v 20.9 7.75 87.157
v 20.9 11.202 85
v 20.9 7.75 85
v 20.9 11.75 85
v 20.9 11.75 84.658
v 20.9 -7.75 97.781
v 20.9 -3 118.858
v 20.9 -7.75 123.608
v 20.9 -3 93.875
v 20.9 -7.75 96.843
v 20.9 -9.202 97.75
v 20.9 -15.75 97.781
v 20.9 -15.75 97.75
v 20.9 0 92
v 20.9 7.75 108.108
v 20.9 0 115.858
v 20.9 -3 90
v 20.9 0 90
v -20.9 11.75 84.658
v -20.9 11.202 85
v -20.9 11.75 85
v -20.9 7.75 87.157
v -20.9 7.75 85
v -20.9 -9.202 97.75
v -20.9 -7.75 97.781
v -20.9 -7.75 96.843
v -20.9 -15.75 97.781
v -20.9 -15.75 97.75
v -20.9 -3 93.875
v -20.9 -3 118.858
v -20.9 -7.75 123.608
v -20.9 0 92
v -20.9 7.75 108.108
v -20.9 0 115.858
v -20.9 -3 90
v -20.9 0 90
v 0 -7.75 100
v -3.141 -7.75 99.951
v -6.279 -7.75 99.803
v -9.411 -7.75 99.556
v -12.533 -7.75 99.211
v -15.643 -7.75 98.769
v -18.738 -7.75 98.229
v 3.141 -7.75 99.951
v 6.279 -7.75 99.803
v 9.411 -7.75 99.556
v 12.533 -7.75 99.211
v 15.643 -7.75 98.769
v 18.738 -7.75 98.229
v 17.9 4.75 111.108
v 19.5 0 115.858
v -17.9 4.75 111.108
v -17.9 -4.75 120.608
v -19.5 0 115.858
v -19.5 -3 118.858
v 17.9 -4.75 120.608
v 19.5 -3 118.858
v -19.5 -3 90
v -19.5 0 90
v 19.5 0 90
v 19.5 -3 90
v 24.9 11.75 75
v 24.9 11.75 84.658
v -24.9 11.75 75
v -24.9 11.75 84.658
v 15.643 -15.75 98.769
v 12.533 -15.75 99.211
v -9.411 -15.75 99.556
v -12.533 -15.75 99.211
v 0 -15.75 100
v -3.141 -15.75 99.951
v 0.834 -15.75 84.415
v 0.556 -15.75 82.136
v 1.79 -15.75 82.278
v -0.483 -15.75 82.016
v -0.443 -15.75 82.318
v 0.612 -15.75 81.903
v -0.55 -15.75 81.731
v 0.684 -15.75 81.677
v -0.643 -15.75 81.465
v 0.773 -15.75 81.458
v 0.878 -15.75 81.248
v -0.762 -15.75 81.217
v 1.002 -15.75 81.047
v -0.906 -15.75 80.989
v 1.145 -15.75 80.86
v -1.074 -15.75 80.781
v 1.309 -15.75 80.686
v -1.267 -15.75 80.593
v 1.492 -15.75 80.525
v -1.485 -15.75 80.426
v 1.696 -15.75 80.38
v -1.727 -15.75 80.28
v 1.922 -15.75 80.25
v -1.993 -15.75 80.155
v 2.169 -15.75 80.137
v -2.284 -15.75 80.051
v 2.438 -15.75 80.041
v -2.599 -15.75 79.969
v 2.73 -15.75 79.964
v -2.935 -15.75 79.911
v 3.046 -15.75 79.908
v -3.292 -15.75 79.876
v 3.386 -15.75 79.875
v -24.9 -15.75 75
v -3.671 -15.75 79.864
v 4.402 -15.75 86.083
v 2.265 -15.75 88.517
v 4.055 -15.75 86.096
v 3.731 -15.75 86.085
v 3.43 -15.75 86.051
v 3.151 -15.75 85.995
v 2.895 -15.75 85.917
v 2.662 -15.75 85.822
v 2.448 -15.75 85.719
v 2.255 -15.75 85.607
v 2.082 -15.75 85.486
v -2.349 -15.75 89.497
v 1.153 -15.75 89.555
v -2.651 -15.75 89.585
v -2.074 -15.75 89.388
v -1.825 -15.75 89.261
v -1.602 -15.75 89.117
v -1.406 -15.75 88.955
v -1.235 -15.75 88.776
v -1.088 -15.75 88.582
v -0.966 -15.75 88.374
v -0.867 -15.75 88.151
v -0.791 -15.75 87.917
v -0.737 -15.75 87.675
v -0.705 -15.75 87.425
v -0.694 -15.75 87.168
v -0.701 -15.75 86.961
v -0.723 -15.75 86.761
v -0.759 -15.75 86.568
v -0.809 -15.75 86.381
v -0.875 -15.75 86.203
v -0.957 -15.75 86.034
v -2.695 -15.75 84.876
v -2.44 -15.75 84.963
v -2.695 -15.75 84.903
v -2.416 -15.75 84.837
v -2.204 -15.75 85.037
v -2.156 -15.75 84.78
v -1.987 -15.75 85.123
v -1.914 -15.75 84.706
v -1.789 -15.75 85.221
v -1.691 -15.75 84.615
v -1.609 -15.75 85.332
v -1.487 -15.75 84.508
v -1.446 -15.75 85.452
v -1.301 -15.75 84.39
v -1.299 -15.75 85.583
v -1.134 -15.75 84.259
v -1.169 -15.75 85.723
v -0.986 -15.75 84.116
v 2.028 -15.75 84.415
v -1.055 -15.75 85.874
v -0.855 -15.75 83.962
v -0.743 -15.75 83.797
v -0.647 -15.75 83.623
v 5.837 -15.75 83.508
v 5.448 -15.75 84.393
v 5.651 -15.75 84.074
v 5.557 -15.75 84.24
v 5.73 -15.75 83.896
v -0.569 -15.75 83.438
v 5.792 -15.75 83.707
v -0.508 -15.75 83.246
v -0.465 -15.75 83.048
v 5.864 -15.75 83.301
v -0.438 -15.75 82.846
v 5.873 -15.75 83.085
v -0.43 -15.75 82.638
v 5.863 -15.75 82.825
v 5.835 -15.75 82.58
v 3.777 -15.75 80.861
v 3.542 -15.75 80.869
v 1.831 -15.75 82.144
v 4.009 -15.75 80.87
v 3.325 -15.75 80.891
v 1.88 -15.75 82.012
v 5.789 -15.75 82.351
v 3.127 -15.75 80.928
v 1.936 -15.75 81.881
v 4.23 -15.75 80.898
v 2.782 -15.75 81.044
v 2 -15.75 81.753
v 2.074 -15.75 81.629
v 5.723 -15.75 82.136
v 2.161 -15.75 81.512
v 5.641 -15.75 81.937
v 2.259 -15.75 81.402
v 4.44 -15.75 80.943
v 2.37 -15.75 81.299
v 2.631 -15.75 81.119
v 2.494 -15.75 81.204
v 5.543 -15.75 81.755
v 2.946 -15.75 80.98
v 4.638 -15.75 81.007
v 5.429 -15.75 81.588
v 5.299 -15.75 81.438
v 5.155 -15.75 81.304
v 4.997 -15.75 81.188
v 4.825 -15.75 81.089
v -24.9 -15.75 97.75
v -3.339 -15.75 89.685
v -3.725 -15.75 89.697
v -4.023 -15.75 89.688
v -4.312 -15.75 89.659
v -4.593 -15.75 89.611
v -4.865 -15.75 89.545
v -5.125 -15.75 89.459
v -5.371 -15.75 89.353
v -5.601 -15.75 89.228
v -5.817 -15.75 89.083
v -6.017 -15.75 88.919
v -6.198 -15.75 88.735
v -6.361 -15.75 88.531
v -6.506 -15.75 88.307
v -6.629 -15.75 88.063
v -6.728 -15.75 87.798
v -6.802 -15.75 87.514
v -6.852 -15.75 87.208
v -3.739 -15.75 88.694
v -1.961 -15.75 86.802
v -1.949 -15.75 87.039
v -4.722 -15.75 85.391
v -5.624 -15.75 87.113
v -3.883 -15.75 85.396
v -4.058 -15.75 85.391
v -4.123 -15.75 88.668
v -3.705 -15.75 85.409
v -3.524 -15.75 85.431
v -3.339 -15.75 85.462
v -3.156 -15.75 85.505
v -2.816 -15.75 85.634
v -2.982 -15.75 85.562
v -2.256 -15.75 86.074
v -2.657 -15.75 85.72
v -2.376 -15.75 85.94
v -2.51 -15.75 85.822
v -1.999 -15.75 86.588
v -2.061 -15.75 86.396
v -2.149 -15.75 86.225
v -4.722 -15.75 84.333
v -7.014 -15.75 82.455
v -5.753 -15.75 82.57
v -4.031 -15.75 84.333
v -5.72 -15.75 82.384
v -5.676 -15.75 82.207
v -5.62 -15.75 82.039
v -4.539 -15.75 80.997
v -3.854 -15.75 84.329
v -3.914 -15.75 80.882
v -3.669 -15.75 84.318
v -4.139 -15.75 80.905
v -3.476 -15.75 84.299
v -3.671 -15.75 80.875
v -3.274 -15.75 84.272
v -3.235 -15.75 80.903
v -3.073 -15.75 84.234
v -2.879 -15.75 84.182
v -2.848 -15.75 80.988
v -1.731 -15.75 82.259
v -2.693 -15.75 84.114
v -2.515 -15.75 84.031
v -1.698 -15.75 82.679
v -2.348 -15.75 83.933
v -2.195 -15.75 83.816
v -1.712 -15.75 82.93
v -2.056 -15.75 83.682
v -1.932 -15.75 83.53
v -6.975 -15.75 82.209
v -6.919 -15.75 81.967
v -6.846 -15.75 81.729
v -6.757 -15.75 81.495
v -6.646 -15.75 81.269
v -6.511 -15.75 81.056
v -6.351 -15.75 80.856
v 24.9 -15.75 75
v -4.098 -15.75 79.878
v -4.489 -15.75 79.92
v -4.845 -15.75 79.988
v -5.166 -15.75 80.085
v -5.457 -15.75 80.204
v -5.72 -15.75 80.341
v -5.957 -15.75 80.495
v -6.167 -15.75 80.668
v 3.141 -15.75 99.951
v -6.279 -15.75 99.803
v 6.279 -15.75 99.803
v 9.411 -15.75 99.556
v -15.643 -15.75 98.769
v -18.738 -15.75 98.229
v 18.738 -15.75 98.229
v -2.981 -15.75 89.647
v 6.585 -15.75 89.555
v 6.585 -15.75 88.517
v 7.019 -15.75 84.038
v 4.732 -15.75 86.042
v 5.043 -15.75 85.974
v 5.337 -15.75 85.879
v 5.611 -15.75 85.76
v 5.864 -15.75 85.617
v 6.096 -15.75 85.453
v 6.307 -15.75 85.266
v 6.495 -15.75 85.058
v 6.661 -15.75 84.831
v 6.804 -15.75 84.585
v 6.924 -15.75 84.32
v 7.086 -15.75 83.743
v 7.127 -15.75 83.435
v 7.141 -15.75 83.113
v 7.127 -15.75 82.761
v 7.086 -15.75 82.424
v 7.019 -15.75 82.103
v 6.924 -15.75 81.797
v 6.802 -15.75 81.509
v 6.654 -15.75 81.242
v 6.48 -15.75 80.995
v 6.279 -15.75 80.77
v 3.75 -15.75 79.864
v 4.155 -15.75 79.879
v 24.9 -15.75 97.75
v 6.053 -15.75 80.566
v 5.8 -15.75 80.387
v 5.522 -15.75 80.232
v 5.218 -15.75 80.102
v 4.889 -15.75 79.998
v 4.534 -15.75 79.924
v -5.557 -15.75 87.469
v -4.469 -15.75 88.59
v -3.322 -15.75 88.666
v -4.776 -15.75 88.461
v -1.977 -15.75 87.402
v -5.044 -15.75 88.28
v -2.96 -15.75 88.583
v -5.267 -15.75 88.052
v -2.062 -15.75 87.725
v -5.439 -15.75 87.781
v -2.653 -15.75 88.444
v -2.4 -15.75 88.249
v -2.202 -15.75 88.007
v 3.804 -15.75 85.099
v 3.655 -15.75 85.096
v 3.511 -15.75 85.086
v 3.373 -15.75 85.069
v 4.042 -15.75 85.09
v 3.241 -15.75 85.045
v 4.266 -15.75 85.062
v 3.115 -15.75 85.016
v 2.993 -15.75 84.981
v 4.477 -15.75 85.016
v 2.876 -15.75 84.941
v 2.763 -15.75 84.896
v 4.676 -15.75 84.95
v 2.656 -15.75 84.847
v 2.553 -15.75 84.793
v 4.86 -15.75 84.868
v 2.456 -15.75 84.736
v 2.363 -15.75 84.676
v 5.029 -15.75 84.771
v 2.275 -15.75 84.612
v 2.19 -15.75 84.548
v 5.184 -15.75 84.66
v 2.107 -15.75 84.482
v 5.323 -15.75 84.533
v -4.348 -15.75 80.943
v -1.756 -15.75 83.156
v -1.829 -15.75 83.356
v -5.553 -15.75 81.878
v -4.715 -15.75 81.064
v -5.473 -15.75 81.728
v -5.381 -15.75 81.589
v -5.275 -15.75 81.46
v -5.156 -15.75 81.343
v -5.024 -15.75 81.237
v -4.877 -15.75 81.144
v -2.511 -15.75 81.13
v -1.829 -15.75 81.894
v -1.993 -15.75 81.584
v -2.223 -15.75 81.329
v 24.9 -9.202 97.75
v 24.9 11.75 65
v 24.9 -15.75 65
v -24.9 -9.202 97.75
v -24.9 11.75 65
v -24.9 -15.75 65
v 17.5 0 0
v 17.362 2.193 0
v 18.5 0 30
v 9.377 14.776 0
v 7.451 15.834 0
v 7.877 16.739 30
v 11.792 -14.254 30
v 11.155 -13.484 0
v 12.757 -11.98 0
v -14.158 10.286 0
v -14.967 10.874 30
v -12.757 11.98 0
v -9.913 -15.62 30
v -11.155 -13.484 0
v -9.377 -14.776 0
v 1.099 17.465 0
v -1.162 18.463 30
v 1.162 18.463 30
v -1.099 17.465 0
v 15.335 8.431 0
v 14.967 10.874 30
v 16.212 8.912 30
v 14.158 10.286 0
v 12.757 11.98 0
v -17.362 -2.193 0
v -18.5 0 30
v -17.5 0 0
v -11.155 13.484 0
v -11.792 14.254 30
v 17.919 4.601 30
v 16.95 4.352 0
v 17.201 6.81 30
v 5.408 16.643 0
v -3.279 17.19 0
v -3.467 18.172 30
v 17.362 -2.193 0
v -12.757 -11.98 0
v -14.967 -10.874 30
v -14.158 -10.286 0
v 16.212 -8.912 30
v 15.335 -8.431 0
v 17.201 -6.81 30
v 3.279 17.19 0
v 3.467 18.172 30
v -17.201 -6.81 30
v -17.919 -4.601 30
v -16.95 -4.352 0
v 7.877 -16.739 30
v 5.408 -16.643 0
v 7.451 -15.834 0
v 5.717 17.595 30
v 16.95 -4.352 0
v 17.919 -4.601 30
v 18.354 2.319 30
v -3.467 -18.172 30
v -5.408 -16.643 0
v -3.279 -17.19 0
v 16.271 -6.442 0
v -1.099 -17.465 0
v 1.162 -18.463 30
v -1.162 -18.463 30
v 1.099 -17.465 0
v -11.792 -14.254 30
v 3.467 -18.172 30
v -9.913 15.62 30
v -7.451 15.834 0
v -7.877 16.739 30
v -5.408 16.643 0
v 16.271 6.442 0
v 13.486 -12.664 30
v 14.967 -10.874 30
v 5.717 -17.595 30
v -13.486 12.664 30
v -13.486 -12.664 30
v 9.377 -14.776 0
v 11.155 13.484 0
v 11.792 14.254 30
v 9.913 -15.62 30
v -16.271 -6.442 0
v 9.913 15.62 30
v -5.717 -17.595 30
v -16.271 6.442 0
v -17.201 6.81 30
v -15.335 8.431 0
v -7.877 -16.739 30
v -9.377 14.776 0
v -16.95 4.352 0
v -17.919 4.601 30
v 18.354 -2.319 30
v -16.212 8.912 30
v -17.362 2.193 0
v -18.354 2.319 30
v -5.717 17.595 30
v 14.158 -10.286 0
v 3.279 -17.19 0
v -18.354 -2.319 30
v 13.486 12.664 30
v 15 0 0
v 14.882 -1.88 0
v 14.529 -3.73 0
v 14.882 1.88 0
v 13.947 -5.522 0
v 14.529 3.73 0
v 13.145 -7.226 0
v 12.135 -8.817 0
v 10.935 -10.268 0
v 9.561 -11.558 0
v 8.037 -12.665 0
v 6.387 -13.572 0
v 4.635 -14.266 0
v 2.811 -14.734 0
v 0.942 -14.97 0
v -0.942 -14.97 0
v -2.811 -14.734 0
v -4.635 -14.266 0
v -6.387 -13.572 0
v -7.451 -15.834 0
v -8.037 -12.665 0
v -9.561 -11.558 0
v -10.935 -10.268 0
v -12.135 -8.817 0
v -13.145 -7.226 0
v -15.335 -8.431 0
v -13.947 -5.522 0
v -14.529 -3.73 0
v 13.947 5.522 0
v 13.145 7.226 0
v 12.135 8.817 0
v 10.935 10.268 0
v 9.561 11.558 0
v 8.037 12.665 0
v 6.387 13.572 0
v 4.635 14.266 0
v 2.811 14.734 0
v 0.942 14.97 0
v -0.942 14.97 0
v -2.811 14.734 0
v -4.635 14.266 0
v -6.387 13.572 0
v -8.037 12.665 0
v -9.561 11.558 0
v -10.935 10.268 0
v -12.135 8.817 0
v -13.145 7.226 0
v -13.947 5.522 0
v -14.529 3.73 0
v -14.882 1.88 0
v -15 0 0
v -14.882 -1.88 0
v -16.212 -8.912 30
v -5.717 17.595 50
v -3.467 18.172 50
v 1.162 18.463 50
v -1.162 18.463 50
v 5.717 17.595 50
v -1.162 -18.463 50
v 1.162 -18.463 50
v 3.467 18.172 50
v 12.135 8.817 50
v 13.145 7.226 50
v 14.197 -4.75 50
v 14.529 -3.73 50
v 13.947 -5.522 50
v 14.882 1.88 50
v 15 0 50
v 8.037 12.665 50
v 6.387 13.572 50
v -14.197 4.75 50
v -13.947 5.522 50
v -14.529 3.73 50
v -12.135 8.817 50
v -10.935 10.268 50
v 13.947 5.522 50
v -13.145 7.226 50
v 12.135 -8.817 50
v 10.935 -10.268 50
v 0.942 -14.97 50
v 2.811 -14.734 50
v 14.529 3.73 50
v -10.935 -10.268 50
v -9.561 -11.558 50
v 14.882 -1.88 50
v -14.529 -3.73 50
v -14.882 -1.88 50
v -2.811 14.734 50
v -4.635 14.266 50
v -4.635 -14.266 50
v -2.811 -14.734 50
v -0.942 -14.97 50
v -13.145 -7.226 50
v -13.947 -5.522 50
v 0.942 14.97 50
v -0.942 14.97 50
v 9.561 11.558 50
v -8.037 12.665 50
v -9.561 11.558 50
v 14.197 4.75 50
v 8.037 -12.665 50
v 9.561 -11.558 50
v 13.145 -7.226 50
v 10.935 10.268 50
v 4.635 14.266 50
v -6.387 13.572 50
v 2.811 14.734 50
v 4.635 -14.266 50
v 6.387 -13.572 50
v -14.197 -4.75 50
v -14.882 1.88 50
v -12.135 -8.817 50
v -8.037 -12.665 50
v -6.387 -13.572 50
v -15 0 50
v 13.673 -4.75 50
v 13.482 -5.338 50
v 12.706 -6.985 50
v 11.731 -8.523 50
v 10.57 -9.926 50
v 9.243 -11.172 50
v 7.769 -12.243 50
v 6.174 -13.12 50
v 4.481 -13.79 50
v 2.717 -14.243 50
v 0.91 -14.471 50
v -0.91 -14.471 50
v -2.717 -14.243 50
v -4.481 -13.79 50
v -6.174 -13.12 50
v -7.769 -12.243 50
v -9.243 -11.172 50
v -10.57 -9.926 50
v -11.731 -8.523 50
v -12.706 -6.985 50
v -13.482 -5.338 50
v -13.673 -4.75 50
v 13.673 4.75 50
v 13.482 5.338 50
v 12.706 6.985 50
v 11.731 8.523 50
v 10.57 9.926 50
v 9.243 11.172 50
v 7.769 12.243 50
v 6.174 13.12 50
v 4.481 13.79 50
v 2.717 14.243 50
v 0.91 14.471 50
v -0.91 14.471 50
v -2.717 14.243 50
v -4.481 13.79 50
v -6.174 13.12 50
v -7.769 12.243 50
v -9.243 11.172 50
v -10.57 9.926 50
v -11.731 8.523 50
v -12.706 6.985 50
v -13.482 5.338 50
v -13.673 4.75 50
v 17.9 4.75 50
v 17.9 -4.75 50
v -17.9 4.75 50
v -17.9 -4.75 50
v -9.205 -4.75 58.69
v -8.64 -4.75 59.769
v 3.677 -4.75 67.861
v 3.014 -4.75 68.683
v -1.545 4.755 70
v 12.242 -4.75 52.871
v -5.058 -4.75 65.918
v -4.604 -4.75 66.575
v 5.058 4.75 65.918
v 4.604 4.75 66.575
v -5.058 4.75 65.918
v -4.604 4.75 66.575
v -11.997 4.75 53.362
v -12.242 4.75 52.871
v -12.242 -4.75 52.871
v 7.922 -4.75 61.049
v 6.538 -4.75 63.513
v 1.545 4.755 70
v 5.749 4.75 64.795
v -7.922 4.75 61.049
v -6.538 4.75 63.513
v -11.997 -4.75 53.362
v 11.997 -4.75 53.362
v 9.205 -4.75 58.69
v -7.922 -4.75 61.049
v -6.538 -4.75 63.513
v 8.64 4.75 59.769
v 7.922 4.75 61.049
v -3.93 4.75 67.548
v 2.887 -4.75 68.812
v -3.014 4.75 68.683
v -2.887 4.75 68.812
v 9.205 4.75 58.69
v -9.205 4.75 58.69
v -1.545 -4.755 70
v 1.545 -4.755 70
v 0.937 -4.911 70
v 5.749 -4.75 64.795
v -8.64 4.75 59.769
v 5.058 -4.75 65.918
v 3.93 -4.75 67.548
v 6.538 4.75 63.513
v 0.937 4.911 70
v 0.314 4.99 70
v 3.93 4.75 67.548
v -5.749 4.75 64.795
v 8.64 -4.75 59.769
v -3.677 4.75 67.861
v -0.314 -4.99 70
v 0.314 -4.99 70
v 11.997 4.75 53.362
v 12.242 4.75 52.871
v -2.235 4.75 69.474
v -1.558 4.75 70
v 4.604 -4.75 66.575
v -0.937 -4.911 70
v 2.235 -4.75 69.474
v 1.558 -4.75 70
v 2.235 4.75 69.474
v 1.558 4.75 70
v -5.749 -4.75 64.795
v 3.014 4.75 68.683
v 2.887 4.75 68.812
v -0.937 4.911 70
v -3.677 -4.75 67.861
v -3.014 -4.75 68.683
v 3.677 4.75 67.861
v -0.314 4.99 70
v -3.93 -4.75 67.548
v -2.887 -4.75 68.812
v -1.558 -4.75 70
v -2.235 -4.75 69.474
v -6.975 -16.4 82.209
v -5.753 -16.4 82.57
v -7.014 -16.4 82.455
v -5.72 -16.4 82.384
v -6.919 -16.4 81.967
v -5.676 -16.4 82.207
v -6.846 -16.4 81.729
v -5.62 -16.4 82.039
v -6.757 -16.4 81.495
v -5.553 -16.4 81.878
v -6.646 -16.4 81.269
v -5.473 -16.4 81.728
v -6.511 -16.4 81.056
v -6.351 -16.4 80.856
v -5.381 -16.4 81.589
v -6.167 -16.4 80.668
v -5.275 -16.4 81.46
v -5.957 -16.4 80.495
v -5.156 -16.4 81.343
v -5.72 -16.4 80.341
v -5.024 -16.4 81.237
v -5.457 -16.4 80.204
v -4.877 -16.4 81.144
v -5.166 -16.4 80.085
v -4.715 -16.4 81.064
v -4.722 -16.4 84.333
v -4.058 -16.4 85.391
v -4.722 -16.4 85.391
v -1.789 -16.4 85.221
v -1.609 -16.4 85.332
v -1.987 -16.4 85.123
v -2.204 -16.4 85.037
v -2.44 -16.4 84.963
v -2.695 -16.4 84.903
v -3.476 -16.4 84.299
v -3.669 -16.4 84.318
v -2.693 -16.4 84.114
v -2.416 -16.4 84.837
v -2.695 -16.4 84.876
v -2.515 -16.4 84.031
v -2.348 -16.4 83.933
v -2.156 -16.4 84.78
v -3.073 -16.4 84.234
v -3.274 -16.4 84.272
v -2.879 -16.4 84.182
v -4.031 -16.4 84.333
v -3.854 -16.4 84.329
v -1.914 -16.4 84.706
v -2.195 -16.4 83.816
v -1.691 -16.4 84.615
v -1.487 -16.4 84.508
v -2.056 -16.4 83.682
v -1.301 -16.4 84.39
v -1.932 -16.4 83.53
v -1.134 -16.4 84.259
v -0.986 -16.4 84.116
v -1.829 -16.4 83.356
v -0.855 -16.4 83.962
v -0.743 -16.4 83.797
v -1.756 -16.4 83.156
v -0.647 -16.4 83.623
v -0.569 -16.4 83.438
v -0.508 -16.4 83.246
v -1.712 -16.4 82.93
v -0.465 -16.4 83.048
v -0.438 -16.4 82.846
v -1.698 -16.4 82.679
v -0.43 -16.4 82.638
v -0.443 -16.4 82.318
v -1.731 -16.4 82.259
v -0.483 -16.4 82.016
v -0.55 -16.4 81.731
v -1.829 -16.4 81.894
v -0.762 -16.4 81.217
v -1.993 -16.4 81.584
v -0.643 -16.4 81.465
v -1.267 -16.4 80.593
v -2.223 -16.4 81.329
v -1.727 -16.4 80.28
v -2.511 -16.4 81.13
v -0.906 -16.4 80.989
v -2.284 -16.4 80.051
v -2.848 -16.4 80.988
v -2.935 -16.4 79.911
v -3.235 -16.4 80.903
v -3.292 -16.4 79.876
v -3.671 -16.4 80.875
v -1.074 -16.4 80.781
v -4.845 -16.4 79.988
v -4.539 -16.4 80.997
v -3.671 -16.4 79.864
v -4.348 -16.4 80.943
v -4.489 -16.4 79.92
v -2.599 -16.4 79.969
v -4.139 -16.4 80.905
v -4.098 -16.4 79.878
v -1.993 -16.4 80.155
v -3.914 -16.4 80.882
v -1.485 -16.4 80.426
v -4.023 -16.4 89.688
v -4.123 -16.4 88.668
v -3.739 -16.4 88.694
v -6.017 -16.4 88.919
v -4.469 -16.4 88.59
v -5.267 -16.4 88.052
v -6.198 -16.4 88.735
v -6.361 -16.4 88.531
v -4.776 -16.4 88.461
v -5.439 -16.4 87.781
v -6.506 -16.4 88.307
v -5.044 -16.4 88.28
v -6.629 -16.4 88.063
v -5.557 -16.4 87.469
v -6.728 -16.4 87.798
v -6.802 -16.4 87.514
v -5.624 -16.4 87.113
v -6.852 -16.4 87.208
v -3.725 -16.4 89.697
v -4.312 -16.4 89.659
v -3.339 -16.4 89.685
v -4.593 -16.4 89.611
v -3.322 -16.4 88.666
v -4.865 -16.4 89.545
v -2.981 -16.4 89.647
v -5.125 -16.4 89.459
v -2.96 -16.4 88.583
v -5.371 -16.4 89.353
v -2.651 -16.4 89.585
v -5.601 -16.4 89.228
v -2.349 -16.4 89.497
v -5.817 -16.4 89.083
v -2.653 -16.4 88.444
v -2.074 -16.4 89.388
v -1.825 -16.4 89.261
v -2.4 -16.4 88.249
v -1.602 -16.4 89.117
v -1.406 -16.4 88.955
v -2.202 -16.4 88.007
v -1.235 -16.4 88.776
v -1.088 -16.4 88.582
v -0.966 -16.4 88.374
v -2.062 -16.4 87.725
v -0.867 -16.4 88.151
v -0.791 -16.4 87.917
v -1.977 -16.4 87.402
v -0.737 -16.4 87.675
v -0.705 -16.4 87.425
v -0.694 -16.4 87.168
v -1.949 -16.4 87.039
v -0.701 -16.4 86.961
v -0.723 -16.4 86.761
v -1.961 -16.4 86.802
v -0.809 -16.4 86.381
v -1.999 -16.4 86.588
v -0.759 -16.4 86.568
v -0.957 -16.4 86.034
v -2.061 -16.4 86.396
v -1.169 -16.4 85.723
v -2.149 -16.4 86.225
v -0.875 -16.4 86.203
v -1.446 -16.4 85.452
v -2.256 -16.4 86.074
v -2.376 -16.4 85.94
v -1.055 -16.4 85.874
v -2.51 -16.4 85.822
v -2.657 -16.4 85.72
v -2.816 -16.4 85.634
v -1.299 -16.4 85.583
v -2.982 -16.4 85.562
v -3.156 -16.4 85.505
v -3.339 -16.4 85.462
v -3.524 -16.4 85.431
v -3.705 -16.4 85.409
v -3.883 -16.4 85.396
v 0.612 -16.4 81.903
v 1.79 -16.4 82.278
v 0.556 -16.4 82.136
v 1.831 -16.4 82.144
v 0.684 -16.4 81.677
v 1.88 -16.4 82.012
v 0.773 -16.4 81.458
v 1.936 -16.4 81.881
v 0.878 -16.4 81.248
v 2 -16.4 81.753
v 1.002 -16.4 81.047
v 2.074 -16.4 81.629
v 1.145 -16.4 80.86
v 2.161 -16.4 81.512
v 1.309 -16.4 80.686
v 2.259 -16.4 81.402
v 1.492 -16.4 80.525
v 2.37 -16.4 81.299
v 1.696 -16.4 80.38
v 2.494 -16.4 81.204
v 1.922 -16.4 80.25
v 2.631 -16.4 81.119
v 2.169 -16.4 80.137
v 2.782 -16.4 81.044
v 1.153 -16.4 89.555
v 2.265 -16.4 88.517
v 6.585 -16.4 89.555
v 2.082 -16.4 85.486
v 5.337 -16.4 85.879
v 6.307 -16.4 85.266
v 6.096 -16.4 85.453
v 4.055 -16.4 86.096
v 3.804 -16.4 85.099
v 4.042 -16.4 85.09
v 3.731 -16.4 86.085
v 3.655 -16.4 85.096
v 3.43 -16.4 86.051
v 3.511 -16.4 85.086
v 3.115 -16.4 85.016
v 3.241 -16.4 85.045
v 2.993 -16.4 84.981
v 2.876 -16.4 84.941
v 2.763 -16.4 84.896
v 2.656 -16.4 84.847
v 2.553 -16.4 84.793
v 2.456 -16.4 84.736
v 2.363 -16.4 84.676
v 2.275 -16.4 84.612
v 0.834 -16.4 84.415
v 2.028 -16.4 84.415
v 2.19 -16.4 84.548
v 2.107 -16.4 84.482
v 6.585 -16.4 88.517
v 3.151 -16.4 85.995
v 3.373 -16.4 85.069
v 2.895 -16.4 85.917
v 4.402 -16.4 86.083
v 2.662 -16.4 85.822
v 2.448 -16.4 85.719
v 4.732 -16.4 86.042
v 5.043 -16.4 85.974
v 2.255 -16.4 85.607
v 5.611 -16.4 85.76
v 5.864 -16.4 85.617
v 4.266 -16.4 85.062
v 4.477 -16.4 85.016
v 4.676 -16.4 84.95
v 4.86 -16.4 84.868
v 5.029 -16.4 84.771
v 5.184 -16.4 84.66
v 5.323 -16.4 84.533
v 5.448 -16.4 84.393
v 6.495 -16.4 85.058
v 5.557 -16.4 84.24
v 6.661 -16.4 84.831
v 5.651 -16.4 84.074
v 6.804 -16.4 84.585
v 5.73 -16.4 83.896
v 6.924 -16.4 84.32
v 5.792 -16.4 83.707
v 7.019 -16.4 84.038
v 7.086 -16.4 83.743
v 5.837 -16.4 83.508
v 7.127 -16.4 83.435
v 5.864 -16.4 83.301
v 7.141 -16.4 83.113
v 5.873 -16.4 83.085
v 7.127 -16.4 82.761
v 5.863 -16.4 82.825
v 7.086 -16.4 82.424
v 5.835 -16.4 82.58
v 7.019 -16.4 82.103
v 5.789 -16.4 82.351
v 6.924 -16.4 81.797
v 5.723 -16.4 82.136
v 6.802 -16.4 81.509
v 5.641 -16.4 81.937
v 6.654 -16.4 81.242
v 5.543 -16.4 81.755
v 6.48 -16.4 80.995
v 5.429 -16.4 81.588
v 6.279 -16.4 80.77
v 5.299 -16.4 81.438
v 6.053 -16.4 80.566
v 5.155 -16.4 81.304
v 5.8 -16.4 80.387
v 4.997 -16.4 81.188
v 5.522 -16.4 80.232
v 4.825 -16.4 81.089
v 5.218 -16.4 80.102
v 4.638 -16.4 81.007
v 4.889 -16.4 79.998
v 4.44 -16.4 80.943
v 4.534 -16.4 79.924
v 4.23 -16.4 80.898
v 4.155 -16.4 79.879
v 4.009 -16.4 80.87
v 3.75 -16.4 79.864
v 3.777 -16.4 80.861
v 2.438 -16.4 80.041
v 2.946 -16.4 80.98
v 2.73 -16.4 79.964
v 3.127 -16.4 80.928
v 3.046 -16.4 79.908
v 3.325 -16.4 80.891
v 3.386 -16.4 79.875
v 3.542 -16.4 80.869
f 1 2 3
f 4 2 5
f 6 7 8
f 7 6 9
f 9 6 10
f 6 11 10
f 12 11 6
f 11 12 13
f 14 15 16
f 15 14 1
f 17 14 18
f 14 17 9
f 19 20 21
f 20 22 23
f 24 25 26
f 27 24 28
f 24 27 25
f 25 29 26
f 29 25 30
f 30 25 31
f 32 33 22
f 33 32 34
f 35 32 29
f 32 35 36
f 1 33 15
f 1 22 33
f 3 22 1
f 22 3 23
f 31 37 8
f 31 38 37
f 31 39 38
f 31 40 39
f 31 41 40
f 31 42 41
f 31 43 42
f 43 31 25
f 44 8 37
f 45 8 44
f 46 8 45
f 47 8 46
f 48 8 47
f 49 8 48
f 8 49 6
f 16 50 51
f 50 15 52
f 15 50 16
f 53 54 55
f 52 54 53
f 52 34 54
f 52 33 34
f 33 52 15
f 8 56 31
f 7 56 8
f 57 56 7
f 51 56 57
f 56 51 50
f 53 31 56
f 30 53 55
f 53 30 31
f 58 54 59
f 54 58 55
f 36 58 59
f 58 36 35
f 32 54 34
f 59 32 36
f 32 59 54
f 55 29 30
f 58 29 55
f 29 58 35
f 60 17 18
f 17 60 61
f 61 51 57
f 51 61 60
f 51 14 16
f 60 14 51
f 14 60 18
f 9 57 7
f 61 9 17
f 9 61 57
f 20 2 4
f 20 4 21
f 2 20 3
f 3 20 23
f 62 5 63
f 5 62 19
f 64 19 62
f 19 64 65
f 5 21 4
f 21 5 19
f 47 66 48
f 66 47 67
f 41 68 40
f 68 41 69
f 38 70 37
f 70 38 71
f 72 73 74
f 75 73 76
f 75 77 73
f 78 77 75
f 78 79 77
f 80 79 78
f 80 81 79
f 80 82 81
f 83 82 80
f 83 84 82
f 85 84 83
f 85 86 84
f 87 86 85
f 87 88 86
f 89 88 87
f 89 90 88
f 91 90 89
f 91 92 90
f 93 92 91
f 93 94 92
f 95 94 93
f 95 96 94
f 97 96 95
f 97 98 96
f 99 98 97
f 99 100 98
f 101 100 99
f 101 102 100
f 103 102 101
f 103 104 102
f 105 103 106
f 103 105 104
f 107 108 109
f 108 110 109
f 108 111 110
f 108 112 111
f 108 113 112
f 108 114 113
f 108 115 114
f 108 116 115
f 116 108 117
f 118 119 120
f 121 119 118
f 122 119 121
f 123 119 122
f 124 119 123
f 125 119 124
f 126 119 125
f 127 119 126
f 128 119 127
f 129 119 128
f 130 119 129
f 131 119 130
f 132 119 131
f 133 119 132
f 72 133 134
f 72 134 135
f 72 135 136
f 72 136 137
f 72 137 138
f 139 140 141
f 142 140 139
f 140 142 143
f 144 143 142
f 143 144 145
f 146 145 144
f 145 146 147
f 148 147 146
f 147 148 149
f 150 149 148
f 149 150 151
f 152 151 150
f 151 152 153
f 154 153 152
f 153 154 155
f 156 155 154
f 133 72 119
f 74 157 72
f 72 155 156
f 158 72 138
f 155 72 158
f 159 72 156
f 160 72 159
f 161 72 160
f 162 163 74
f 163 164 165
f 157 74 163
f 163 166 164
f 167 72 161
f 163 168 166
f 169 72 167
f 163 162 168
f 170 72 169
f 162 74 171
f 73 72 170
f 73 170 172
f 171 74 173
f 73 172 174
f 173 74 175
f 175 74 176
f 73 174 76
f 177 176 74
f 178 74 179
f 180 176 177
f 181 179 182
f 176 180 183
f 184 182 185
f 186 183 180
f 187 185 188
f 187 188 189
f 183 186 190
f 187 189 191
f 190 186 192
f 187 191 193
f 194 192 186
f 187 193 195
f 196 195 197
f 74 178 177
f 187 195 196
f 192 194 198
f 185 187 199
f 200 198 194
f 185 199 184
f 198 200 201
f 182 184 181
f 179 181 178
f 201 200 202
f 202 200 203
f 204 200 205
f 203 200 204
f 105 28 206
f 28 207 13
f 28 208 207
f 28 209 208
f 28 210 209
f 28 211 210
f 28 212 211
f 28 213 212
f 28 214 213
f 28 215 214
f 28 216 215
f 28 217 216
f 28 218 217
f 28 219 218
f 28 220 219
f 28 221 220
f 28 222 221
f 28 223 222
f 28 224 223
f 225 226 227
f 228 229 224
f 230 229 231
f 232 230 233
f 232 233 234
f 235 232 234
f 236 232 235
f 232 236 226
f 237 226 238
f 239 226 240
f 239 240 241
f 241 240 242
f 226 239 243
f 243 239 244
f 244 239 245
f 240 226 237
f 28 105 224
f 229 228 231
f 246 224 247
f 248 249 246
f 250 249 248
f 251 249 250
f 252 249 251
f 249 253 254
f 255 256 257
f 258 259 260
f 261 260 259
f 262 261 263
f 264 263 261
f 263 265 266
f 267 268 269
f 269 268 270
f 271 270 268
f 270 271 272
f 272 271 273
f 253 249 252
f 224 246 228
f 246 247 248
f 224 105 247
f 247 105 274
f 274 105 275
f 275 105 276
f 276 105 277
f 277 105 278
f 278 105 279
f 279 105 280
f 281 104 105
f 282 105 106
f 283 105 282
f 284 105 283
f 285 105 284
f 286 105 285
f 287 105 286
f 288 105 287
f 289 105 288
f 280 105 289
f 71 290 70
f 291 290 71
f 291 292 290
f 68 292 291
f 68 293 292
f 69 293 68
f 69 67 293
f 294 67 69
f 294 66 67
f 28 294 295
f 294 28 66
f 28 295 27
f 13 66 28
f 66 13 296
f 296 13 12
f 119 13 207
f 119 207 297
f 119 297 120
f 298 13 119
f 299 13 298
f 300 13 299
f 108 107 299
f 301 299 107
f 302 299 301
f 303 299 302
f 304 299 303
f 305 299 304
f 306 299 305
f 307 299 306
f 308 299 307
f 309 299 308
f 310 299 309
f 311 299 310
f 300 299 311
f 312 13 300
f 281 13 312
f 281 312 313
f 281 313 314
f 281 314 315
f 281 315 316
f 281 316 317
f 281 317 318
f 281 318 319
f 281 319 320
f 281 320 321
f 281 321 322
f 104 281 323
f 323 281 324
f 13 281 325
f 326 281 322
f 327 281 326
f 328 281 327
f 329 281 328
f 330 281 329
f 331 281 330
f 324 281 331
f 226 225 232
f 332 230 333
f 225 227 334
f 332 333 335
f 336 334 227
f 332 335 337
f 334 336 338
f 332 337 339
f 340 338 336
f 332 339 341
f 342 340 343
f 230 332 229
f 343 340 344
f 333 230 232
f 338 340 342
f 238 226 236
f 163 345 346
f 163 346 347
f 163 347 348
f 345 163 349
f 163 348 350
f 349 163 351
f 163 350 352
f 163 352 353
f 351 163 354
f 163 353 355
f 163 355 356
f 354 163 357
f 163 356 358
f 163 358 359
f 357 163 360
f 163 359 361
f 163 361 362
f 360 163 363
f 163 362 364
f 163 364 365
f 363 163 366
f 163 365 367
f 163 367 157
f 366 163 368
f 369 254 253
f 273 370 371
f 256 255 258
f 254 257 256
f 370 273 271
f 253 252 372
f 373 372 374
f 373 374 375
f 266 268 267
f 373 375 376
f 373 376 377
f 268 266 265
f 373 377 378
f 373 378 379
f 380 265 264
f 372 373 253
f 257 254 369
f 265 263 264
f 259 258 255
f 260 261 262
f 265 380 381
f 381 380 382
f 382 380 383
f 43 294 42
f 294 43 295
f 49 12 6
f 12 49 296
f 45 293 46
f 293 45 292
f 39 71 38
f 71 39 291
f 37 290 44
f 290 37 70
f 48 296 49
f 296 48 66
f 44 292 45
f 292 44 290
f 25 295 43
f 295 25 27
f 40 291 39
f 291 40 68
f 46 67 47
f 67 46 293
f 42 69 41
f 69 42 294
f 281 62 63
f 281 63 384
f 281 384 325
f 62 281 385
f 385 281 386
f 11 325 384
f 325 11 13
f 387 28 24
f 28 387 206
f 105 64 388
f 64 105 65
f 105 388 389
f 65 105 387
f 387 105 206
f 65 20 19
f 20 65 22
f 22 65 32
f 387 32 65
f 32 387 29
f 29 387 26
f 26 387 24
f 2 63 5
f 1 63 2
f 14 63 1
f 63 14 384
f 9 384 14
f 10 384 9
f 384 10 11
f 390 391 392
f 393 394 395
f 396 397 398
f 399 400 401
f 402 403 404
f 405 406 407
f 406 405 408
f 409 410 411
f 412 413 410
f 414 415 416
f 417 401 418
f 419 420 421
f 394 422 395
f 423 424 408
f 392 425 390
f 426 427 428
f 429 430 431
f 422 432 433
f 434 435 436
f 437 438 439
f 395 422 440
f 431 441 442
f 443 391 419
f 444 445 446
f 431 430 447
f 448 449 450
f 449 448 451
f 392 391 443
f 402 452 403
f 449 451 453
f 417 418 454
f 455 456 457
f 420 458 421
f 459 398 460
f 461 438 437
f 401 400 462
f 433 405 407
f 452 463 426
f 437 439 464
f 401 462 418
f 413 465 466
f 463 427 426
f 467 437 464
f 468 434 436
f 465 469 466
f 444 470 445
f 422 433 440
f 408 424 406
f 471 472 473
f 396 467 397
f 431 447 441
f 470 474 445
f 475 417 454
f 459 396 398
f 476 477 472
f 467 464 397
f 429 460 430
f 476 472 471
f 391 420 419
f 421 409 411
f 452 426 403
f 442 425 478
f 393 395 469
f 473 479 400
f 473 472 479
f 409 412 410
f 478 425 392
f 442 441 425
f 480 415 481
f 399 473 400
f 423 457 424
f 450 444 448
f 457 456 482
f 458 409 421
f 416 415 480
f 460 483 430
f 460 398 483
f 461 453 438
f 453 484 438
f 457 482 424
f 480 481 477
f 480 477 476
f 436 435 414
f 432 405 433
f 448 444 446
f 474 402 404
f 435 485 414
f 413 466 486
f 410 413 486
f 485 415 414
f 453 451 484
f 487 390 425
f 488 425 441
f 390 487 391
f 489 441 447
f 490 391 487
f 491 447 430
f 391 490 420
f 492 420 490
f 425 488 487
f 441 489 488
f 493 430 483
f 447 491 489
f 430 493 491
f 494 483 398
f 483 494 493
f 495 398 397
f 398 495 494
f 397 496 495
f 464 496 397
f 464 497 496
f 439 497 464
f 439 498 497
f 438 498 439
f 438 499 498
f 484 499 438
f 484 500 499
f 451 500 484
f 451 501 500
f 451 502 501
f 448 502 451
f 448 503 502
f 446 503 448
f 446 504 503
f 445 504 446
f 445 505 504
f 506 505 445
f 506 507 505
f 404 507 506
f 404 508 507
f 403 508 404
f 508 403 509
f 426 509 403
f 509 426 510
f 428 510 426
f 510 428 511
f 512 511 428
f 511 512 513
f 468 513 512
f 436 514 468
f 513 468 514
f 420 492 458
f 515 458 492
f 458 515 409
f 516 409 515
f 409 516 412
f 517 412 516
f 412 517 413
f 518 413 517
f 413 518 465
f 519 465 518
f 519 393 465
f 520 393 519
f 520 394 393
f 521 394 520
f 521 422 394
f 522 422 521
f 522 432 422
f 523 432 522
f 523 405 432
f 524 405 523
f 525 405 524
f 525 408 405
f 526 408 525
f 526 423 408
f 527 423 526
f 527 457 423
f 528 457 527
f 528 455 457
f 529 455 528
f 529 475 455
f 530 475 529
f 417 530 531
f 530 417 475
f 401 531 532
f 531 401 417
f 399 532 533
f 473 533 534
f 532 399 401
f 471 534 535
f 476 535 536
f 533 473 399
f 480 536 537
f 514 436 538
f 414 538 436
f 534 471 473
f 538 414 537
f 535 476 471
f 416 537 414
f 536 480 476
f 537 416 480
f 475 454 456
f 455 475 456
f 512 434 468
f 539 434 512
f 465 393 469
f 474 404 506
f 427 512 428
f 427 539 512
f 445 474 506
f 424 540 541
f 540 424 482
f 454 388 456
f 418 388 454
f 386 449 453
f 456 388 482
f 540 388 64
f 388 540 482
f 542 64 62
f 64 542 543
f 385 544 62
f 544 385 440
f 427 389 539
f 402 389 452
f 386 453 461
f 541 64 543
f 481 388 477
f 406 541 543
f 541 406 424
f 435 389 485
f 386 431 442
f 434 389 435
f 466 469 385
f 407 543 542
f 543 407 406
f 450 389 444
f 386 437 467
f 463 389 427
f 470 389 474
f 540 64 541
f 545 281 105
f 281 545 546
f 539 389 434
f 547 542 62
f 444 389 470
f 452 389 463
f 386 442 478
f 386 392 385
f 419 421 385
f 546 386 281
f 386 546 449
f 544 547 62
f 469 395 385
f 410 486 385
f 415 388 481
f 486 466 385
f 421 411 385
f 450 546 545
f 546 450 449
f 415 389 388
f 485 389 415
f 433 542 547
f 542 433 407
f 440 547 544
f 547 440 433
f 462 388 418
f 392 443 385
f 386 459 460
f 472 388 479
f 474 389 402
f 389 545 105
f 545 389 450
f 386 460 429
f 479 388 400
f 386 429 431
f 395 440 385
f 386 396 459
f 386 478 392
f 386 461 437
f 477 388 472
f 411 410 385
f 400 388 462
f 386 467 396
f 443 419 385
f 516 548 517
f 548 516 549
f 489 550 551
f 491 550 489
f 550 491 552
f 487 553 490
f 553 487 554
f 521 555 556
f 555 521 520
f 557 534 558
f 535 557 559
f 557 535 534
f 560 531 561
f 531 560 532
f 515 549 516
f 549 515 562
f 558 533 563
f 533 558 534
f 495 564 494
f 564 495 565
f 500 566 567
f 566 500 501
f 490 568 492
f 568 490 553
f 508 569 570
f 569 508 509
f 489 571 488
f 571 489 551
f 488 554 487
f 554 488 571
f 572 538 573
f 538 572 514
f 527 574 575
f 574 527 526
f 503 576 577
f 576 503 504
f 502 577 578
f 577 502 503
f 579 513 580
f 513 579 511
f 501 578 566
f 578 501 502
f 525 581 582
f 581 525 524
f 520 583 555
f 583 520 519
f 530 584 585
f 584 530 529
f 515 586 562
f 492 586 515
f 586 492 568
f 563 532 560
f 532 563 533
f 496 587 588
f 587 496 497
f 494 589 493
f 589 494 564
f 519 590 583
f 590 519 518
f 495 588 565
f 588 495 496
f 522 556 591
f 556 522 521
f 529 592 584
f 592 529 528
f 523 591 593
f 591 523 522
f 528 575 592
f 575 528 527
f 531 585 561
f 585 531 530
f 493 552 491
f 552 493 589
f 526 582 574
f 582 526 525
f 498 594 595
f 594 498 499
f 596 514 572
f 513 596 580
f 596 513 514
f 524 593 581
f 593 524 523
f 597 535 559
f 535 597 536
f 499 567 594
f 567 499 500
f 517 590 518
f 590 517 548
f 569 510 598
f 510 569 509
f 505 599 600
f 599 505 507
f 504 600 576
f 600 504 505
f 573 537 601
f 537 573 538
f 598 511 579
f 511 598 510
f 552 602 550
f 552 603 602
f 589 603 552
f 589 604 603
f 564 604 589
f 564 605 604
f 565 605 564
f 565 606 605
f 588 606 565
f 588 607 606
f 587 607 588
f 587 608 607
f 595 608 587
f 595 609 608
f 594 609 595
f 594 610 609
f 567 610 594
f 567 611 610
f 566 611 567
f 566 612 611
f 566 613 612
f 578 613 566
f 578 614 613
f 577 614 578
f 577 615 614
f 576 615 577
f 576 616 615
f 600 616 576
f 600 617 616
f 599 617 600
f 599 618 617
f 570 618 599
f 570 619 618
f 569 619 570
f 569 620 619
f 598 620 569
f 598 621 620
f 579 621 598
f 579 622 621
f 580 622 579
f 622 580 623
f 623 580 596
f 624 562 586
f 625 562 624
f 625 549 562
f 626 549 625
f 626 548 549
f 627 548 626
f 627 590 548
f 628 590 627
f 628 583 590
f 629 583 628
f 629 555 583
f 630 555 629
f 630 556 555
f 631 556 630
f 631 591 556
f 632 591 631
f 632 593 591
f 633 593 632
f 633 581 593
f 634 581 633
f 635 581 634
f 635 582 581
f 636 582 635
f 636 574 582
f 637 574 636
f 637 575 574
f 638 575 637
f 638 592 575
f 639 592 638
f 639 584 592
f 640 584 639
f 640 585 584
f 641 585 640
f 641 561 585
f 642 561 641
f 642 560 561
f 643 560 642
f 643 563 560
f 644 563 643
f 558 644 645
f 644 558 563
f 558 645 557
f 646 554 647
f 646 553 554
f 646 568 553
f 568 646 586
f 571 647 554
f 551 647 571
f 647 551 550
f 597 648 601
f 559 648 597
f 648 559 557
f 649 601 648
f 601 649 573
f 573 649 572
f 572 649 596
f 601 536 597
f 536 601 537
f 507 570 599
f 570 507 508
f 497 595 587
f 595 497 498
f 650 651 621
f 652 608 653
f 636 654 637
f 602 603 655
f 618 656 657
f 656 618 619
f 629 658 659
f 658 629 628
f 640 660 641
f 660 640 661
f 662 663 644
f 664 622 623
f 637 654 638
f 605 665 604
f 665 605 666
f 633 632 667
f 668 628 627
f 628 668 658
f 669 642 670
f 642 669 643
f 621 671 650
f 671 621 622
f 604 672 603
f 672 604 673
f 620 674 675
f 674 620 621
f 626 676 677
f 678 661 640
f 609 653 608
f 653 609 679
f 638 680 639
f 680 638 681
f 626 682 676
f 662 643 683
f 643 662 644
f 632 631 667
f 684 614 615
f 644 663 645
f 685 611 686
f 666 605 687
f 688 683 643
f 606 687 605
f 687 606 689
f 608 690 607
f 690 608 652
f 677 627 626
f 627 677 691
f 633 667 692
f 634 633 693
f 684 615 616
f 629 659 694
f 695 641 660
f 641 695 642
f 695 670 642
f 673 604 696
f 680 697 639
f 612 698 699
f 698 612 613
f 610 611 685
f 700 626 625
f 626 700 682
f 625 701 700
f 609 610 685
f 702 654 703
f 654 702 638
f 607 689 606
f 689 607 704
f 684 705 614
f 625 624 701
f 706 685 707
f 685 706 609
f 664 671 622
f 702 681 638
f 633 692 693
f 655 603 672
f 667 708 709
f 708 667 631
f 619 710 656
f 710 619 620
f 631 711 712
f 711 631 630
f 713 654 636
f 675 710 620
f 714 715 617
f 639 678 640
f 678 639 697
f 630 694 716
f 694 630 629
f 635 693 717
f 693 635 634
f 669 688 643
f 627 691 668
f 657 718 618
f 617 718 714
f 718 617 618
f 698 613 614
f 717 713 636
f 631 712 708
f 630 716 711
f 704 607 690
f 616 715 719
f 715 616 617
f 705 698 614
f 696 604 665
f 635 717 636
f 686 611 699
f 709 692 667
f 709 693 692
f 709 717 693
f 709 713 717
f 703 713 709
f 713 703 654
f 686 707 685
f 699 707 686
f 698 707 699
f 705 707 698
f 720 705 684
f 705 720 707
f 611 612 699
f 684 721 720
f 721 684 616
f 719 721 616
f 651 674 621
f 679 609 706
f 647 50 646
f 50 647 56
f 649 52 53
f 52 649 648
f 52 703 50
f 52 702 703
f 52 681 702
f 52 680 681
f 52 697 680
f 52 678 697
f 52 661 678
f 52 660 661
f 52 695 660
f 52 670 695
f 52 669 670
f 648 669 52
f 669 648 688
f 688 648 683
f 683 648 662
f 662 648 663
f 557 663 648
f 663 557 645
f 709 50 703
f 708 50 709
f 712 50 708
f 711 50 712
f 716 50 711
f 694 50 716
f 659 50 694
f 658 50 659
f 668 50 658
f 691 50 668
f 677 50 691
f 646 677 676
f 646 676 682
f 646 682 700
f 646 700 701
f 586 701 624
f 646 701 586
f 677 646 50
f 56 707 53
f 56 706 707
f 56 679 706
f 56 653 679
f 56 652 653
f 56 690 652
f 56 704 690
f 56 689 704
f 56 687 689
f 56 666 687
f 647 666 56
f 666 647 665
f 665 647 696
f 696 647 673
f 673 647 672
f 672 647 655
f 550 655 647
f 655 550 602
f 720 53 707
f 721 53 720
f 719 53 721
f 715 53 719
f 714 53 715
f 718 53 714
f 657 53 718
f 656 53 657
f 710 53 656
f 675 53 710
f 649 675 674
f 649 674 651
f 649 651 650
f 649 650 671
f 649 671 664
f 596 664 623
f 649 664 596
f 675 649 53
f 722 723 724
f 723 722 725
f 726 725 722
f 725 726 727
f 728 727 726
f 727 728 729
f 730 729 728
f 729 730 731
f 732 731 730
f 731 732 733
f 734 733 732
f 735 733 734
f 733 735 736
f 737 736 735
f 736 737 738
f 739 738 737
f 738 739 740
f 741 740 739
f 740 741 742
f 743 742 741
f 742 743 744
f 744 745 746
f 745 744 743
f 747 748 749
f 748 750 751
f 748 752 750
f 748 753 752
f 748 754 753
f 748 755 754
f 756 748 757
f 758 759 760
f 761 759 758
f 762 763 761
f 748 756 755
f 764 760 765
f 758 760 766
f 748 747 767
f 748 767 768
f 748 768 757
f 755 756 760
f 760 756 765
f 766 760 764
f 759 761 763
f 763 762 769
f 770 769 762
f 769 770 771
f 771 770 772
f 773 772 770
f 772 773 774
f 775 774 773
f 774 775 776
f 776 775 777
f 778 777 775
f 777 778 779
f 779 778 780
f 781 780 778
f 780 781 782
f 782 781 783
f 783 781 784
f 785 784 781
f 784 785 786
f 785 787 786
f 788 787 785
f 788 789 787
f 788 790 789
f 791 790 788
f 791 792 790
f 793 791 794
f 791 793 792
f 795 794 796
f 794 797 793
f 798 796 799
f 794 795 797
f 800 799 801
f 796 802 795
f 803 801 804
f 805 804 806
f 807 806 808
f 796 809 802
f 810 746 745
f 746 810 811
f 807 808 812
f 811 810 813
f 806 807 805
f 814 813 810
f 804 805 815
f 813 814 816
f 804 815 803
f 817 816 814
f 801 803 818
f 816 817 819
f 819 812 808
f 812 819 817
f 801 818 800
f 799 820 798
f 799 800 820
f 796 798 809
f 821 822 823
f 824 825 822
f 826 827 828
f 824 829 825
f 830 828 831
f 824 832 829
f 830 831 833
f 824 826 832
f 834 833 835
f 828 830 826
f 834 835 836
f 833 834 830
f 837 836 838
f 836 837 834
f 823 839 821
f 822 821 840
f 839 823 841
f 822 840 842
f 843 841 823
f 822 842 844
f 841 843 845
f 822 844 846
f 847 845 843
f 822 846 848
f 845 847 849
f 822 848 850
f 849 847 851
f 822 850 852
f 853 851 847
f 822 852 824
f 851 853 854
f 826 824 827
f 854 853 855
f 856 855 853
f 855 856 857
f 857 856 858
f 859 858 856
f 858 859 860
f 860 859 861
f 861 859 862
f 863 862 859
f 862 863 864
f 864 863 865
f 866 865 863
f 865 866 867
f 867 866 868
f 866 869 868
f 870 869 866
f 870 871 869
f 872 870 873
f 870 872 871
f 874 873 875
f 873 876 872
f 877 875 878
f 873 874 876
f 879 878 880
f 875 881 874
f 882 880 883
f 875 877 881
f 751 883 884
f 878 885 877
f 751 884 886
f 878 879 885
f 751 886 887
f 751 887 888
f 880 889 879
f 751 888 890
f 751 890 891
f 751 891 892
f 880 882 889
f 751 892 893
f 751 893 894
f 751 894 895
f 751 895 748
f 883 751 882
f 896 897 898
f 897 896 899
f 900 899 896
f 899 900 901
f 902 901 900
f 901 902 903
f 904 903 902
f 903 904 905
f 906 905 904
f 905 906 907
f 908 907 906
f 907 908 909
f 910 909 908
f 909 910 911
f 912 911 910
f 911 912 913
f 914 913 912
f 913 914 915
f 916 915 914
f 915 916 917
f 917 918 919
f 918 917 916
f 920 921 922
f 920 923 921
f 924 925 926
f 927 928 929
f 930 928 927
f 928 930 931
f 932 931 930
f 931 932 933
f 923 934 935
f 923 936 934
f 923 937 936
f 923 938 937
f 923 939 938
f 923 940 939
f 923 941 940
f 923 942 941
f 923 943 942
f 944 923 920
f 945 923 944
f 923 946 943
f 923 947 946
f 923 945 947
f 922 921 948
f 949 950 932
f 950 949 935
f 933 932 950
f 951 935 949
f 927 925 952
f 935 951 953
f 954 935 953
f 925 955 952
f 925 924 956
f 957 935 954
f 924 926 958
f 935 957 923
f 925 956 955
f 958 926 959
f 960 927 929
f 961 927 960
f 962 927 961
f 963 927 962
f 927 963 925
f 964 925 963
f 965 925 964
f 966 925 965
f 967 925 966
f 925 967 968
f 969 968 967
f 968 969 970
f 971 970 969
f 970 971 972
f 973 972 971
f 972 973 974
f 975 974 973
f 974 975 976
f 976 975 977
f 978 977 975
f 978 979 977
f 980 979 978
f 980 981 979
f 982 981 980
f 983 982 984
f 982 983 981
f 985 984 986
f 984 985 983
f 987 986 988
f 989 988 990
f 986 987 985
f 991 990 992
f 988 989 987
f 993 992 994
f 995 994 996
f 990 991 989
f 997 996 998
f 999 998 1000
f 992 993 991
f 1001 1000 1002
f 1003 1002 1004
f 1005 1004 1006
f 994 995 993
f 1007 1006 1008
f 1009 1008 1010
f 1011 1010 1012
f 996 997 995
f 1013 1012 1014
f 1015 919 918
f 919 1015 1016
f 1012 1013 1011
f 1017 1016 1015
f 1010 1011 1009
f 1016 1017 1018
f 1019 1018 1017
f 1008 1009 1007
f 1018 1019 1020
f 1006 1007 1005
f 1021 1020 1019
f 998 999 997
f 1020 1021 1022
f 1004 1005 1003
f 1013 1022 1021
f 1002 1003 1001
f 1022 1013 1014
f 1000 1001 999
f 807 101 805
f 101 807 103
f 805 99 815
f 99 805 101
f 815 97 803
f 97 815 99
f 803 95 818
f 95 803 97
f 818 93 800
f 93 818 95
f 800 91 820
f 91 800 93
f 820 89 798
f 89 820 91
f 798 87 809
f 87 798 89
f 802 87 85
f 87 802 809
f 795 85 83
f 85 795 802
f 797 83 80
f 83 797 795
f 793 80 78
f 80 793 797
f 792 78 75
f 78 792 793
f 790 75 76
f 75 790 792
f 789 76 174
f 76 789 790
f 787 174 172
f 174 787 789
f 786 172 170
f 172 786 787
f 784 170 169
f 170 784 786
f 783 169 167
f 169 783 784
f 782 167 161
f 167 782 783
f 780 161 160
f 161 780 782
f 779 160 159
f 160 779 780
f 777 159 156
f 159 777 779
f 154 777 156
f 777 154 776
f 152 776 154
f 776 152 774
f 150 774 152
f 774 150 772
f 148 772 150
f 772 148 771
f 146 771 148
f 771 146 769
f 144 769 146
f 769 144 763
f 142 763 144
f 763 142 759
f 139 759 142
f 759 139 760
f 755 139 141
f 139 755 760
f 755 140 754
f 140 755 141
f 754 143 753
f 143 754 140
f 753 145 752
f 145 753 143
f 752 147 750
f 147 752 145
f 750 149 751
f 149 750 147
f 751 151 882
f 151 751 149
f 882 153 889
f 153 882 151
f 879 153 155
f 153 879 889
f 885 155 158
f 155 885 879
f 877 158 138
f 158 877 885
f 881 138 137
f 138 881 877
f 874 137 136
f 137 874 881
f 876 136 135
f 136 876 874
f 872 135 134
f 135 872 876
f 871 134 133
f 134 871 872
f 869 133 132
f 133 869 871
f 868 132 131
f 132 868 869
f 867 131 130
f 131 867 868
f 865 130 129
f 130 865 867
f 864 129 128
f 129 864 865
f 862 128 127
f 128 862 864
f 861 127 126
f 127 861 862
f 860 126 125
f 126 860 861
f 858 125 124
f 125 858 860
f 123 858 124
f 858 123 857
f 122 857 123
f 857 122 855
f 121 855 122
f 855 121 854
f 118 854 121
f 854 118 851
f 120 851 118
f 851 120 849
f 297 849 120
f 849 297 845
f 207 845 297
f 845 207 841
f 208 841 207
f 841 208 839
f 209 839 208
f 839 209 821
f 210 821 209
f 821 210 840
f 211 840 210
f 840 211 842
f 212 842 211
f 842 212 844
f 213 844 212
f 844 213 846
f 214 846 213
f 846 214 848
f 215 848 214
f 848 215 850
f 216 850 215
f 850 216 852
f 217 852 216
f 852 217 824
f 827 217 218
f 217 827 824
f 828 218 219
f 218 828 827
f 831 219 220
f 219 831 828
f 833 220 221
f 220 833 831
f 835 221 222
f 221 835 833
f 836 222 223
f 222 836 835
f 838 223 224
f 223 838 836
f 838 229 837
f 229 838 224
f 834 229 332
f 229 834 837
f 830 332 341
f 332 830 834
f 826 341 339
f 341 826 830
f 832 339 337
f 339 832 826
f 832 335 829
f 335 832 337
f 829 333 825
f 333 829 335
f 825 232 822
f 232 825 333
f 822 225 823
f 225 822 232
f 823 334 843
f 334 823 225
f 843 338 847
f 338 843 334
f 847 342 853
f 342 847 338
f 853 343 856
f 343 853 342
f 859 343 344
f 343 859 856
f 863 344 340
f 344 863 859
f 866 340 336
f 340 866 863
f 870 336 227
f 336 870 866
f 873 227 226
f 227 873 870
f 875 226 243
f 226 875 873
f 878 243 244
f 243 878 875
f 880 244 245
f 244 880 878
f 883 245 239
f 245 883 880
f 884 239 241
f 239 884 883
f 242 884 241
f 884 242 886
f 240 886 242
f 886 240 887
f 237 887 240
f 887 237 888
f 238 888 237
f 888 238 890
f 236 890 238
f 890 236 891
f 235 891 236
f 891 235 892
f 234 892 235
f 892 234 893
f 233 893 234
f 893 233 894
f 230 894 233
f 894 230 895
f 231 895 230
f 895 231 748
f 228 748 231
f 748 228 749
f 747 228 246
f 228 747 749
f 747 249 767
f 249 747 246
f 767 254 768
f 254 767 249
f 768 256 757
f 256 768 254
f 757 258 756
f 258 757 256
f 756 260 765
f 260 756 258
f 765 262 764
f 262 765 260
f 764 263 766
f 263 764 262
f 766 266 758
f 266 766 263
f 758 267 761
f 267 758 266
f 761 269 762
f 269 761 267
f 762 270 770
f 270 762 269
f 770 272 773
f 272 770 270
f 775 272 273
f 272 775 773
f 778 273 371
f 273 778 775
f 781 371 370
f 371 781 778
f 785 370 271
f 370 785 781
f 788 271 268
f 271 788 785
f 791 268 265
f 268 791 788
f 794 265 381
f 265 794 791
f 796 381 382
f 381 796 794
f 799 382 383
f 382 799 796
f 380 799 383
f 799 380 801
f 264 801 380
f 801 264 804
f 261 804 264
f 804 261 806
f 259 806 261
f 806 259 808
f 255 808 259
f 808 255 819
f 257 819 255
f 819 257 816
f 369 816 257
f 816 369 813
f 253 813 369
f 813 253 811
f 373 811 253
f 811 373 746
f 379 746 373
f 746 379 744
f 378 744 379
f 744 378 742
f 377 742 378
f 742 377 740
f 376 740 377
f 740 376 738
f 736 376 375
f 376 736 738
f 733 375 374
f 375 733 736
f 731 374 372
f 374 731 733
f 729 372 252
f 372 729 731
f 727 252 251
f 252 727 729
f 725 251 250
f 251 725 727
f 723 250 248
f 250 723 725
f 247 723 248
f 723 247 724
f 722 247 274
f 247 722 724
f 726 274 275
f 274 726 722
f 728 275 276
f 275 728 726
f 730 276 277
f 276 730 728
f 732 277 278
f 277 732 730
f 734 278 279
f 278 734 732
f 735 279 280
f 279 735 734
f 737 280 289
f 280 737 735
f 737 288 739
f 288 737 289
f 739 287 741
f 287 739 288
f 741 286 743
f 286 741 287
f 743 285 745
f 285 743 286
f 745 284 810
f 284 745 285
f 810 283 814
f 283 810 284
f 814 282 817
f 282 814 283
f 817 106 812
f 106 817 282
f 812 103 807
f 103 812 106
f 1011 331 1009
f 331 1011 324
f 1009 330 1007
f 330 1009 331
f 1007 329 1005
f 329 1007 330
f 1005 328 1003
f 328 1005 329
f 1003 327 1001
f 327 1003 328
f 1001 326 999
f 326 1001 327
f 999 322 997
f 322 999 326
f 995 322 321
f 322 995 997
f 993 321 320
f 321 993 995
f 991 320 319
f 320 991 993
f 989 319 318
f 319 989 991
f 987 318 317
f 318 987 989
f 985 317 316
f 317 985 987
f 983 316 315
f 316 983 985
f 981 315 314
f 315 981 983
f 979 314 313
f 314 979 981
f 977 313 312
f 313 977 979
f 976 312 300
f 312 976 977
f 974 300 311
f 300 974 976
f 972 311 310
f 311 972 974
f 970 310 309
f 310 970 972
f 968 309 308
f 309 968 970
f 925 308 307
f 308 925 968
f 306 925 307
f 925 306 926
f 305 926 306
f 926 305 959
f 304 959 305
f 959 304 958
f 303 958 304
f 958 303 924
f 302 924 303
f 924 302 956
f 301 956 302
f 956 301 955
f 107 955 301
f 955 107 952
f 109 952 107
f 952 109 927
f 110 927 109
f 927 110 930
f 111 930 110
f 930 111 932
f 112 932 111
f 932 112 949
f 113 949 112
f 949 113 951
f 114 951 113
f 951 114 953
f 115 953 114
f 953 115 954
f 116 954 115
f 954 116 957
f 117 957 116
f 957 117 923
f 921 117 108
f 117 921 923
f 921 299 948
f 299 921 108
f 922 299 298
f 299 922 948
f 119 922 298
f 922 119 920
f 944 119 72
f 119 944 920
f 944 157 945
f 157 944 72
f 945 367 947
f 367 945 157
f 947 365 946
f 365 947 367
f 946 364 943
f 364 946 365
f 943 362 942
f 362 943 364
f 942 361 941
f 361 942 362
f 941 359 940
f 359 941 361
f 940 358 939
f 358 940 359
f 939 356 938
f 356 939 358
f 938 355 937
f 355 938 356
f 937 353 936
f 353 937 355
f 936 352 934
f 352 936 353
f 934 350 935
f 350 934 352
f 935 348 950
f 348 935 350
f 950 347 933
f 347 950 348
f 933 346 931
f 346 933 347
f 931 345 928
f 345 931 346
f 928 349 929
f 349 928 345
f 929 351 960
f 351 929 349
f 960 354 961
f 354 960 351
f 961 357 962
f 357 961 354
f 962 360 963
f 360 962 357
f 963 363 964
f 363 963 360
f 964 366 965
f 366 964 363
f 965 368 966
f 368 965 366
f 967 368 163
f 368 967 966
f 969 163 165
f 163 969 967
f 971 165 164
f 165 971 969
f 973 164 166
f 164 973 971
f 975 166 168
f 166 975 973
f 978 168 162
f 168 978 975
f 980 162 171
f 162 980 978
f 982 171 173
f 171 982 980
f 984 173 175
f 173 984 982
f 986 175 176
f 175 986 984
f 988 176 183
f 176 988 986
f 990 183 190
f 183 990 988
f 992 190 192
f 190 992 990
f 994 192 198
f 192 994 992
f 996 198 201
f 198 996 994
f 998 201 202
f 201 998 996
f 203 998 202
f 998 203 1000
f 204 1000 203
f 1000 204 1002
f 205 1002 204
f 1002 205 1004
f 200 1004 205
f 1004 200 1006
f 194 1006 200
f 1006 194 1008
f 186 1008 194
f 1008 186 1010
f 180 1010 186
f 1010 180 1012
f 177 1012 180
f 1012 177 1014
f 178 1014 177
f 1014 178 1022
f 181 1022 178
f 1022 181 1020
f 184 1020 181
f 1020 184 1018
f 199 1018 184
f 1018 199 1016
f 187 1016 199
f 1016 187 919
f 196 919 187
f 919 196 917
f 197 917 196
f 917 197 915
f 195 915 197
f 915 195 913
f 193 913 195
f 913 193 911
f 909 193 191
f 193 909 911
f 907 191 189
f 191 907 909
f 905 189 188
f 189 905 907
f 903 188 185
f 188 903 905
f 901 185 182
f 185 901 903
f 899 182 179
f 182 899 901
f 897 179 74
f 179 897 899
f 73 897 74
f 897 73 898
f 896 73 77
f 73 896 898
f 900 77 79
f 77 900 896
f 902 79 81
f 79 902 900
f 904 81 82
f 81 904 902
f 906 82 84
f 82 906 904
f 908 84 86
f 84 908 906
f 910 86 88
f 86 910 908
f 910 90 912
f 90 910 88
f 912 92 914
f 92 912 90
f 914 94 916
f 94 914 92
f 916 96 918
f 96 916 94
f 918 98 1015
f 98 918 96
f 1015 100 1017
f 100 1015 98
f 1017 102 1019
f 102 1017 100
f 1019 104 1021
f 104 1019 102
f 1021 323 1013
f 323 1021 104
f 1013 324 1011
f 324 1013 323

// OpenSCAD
// outer diameter of the tube. usefull values are 38, 35, 32
outer_diameter = 35;

/* [Hidden] */
tube_height = 50;
aeg_width = 41.8;
aeg_depth = 15.5;
aeg_height = 60;

difference() {
    // the thing
    union() {
        // upper part
        translate([0,0,50+tube_height]) {
            // to aeg
            difference() {
                cube([aeg_width, aeg_depth, aeg_height], center=true);
                // cut top
                translate([0,0,30]) rotate([45,0,0]) cube([2*aeg_width,20,50], center=true);
                // cut sides
                translate([-25,-3,-10]) cube([5.5, 3, 50]);
                translate([25-5.5,-3,-10]) cube([5.5, 3, 50]);
            }
            // sealing top & bottom
            translate([0,0,-20]) difference() {
                union() {
                    // top
                    translate([-50,aeg_depth/2,-95]) cube([100, 4, 100]);
                    // bottom
                    translate([0,-aeg_depth/2-4,-80]) rotate([90,0,0]) cylinder(r=100, h=8, center=true, $fn=200);
                }
                translate([-aeg_width/2-50,0,0]) cube([100, 100, 500], center=true);
                translate([+aeg_width/2+50,0,0]) cube([100, 100, 500], center=true);
                translate([0,0,-105]) cube([500, 100, 200], center=true);
            }
            // sealing side
            translate([0,0,-25]) difference() {
                union() {
                    translate([aeg_width/2+2,-2,22.5/2]) cube([4, aeg_depth+12, 23], center=true);
                    translate([-aeg_width/2-2,-2,22.5/2]) cube([4, aeg_depth+12, 23], center=true);
                }
                translate([0,0,17]) rotate([-32,0,0]) translate([-50,-50,0]) cube([100, 100, 100]);
            }
        }
        // tube
        union() {
            cylinder(r1=outer_diameter/2, r2=outer_diameter/2+1, h=tube_height*0.6, $fn=50);
            hull() {
                translate([0,0,tube_height*0.6]) cylinder(r=outer_diameter/2+1, h=tube_height*0.4, $fn=50);
                translate([0,-2,tube_height+20]) cube([aeg_width+8, aeg_depth+12, 10], center=true);
            }
        }
    }
    
    // cut...
    translate([0,0,-10]) cylinder(r=outer_diameter/2-2.5, h=tube_height+10, $fn=50);
    translate([0,0,tube_height]) cylinder(r1=outer_diameter/2-3, r2=5, h=20, $fn=50);
    translate([0,0,tube_height+90/2]) cube([aeg_width-6, 15.5-6, 90], center=true);
}

translate([0,-15.4,30+tube_height]) rotate([90,0,0]) linear_extrude(height = 1) {
       text(text = str(outer_diameter), halign = "center");
}
